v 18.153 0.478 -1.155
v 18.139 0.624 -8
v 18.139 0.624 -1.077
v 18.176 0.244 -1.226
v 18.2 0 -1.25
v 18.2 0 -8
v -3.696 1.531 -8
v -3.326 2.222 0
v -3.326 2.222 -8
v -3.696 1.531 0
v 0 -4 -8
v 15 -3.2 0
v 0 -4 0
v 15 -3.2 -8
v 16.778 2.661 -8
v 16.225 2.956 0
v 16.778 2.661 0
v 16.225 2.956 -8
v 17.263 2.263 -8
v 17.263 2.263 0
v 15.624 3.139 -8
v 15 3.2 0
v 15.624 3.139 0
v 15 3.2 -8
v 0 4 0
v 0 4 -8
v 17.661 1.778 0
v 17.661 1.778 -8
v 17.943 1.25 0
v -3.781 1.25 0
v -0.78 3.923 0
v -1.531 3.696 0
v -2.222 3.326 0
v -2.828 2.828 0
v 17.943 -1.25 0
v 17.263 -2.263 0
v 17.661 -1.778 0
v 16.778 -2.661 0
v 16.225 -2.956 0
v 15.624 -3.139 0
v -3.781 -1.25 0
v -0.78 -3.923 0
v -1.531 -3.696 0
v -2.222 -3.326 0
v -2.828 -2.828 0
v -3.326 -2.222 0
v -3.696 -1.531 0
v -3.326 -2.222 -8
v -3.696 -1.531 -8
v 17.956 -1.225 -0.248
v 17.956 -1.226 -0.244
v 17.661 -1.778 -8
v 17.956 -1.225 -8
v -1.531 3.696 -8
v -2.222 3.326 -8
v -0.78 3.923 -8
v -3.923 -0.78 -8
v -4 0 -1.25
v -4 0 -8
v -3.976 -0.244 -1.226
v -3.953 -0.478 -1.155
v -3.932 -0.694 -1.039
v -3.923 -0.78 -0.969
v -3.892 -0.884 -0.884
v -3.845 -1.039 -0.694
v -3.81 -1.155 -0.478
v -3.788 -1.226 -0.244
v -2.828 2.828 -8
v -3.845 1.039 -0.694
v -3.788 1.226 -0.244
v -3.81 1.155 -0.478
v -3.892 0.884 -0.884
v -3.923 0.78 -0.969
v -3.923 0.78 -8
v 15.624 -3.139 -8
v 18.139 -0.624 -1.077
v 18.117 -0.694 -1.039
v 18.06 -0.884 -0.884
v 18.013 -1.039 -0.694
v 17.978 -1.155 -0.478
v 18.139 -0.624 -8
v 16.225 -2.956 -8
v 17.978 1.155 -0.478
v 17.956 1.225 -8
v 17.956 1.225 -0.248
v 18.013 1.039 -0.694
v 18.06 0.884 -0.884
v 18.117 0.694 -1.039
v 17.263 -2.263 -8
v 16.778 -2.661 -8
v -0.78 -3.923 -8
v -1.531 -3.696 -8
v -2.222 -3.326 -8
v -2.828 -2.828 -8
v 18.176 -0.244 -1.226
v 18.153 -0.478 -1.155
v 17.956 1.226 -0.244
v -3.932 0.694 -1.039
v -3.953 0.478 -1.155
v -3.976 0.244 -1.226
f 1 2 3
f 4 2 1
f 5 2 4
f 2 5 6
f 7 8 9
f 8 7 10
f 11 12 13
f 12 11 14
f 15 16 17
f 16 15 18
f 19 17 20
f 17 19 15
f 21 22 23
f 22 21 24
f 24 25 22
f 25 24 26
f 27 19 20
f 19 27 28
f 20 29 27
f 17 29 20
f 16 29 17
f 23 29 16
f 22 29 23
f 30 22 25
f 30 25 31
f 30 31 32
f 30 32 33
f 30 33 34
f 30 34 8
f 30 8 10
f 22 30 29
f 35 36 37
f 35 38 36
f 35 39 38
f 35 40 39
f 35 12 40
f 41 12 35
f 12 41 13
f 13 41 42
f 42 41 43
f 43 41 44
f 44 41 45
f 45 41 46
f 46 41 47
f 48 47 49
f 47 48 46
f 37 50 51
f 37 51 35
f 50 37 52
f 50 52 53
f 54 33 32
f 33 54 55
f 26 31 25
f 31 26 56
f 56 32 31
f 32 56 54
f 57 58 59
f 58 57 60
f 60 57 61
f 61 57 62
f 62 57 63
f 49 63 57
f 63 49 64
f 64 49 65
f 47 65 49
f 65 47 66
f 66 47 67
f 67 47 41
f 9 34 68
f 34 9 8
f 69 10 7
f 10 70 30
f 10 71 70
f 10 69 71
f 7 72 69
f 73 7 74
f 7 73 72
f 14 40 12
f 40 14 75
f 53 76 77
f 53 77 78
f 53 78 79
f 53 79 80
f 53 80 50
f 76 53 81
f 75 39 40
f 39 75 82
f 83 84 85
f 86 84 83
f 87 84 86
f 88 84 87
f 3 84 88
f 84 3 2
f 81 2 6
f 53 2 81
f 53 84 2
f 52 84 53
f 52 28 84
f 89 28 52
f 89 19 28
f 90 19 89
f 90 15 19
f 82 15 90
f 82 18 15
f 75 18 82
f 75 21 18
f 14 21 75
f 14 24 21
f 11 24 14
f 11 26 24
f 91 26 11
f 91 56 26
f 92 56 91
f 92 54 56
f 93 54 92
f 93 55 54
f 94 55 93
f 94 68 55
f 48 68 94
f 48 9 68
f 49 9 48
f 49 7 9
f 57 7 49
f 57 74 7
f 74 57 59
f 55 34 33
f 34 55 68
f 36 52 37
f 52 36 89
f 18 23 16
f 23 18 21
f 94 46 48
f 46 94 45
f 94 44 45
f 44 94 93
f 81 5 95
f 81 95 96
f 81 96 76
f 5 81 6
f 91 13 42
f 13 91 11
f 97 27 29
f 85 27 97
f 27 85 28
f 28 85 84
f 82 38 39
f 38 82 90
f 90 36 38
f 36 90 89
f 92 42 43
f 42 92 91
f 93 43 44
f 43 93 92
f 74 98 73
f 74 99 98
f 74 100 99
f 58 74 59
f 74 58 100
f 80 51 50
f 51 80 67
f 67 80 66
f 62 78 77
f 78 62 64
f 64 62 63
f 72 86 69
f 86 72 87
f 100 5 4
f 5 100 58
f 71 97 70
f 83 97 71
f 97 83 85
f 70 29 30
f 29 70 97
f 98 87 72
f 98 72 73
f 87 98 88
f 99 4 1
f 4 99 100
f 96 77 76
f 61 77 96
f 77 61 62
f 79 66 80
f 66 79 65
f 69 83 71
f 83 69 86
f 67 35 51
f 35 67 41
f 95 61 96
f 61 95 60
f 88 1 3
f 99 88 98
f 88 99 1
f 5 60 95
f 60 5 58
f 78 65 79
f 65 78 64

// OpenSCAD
// COBRA Finger Segment - DISTAL
// Length: 15.0mm, Width: 8mm

$fn = 32;

module finger_segment() {
    difference() {
        hull() {
            translate([0, 0, -4])
            cylinder(h=8, d=8, center=true);
            
            translate([15.0, 0, -4])
            cylinder(h=8, d=6.4, center=true);
        }
        
        // Tendon channel
        translate([7.5, 0, 0])
        rotate([0, 90, 0])
        cylinder(h=17.0, d=2.5, center=true);
        
        // Pivot holes
        translate([0, 0, 0])
        rotate([0, 90, 0])
        cylinder(h=10, d=2.5, center=true);
        
        translate([15.0, 0, 0])
        rotate([0, 90, 0])
        cylinder(h=10, d=2.5, center=true);
    }
}

finger_segment();
